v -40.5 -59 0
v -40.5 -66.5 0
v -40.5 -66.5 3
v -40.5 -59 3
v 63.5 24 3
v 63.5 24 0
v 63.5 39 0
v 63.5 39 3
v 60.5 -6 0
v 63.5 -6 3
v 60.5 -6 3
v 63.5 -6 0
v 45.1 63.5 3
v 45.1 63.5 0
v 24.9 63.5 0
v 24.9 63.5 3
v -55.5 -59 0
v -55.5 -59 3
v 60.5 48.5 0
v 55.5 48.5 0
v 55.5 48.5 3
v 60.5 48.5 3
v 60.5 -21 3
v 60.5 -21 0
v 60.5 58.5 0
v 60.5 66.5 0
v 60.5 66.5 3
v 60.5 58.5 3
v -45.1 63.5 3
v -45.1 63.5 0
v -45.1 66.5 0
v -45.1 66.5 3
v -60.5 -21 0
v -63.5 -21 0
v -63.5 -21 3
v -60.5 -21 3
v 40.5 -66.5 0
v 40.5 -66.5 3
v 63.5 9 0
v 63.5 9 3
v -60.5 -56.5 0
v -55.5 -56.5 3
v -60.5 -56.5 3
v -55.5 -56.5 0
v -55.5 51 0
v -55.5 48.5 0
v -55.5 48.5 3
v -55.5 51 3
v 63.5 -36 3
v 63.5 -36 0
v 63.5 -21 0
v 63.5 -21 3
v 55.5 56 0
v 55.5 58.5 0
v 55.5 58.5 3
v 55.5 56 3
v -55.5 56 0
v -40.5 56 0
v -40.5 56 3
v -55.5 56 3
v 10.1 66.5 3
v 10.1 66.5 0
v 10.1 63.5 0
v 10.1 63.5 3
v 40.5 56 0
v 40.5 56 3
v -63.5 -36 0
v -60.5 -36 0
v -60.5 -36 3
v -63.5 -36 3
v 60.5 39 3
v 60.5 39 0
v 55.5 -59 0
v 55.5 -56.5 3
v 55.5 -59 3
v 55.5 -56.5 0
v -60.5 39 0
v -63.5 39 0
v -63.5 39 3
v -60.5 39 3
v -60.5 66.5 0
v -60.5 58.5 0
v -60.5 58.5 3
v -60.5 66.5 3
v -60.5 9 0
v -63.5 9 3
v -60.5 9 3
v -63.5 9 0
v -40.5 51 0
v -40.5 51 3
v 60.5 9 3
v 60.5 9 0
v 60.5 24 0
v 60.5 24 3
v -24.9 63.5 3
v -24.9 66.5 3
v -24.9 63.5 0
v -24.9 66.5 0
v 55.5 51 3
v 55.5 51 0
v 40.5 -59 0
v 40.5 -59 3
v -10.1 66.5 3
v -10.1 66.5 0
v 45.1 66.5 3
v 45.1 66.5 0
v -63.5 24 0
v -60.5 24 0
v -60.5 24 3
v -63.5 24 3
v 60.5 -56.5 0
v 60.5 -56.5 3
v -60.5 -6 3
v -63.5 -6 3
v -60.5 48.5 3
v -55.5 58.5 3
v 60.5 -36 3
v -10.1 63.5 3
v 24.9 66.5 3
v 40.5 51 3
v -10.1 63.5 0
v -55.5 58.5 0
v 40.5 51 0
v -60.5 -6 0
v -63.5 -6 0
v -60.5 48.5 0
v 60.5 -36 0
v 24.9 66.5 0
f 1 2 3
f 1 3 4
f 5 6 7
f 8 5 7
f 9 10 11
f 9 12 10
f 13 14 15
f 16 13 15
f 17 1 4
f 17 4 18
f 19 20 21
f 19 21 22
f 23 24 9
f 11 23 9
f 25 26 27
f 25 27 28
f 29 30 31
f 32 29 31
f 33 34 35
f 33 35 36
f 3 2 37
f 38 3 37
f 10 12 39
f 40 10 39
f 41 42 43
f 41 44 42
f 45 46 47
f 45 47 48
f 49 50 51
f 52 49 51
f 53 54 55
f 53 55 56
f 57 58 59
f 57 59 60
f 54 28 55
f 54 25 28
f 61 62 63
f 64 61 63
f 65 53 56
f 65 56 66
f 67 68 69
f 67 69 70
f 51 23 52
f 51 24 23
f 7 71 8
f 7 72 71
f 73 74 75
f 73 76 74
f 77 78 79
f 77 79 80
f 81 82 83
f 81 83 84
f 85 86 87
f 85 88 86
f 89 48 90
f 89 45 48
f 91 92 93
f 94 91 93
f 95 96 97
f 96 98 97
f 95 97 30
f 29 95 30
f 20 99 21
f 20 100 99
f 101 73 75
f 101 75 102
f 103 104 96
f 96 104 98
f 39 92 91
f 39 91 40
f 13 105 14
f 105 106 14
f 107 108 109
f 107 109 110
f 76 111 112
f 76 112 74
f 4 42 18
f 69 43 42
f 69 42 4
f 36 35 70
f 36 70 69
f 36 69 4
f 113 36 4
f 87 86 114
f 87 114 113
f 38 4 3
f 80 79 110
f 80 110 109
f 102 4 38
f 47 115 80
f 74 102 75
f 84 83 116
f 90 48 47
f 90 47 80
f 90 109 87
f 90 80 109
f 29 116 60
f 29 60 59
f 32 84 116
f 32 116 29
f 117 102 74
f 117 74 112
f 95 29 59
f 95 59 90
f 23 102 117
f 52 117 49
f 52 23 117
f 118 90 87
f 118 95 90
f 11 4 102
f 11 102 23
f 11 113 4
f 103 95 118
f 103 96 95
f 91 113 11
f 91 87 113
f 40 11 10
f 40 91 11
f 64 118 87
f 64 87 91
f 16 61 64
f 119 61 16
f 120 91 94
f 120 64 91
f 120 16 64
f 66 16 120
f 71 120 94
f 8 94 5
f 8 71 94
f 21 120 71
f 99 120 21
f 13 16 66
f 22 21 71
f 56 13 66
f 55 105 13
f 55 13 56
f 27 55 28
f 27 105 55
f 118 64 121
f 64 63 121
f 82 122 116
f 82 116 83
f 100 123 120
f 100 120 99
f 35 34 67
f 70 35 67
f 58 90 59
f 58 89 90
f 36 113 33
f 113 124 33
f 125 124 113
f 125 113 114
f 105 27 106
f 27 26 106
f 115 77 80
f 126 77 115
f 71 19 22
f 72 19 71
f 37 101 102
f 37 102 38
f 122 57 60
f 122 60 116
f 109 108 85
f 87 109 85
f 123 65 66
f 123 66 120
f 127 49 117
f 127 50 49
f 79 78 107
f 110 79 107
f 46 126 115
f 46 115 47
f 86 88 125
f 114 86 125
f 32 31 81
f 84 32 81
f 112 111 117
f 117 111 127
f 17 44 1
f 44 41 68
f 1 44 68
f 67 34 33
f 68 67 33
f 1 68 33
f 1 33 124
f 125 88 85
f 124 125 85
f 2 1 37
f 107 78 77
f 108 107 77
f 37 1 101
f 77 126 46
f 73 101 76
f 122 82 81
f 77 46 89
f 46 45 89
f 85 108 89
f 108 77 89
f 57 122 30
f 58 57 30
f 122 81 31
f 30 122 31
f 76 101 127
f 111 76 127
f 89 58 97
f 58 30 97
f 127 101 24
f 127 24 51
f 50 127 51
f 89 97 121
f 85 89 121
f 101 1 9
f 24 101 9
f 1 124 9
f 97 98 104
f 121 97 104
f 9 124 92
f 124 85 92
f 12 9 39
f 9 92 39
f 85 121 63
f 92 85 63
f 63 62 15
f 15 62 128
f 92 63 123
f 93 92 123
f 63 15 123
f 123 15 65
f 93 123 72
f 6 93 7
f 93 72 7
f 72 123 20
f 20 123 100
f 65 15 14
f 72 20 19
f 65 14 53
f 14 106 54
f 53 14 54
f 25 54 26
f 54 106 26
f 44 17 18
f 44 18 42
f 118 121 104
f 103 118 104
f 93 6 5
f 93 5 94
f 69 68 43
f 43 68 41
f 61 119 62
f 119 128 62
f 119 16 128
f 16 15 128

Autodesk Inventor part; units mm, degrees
ref_plane "YZ Plane" through (0, 0, 0) normal (1, 0, 0) x (0, 1, 0)
ref_plane "XZ Plane" through (0, 0, 0) normal (0, 1, 0) x (-1, 0, 0)
ref_plane "XY Plane" through (0, 0, 0) normal (0, 0, 1) x (1, 0, 0)
sketch "Sketch1" plane through (0, 0, 0) normal (0, 0, 1) x (1, 0, 0)
  line L0 (-63.5, -66.5) -> (63.5, -66.5)
  line L1 (63.5, -66.5) -> (63.5, 66.5)
  line L2 (63.5, 66.5) -> (-63.5, 66.5)
  line L3 (-63.5, 66.5) -> (-63.5, -66.5)
  line L4 (-63.5, -66.5) -> (63.5, 66.5) construction
  line L5 (63.5, -66.5) -> (-63.5, 66.5) construction
  line L6 (-45.1, 66.5) -> (-24.9, 66.5)
  line L7 (-24.9, 66.5) -> (-24.9, 63.5)
  line L8 (-24.9, 63.5) -> (-45.1, 63.5)
  line L9 (-45.1, 63.5) -> (-45.1, 66.5)
  line L10 (-45.1, 66.5) -> (-24.9, 63.5) construction
  line L11 (-24.9, 66.5) -> (-45.1, 63.5) construction
  line L12 (-10.1, 66.5) -> (10.1, 66.5)
  line L13 (10.1, 66.5) -> (10.1, 63.5)
  line L14 (10.1, 63.5) -> (-10.1, 63.5)
  line L15 (-10.1, 63.5) -> (-10.1, 66.5)
  line L16 (-10.1, 66.5) -> (10.1, 63.5) construction
  line L17 (10.1, 66.5) -> (-10.1, 63.5) construction
  line L18 (24.9, 66.5) -> (45.1, 66.5)
  line L19 (45.1, 66.5) -> (45.1, 63.5)
  line L20 (45.1, 63.5) -> (24.9, 63.5)
  line L21 (24.9, 63.5) -> (24.9, 66.5)
  line L22 (24.9, 66.5) -> (45.1, 63.5) construction
  line L23 (45.1, 66.5) -> (24.9, 63.5) construction
  line L24 (-63.5, 39) -> (-60.5, 39)
  line L25 (-60.5, 39) -> (-60.5, 24) construction
  line L26 (-60.5, 24) -> (-63.5, 24)
  line L27 (-63.5, 24) -> (-63.5, 39)
  line L28 (-63.5, 39) -> (-60.5, 24) construction
  line L29 (-60.5, 39) -> (-63.5, 24) construction
  line L30 (-63.5, 9) -> (-60.5, 9)
  line L31 (-60.5, 9) -> (-60.5, -6) construction
  line L32 (-60.5, -6) -> (-63.5, -6)
  line L33 (-63.5, -6) -> (-63.5, 9)
  line L34 (-63.5, 9) -> (-60.5, -6) construction
  line L35 (-60.5, 9) -> (-63.5, -6) construction
  line L36 (-63.5, -21) -> (-60.5, -21)
  line L37 (-60.5, -21) -> (-60.5, -36) construction
  line L38 (-60.5, -36) -> (-63.5, -36)
  line L39 (-63.5, -36) -> (-63.5, -21)
  line L40 (-63.5, -21) -> (-60.5, -36) construction
  line L41 (-60.5, -21) -> (-63.5, -36) construction
  line L42 (-60.5, 39) -> (-60.5, 66.5)
  line L43 (-60.5, 24) -> (-60.5, 9)
  line L44 (-60.5, -6) -> (-60.5, -21)
  line L45 (-60.5, 51) -> (-40.5, 51)
  line L46 (-40.5, 51) -> (-40.5, 56)
  line L47 (-40.5, 56) -> (-60.5, 56)
  line L48 (-60.5, 56) -> (-60.5, 51)
  line L49 (-60.5, 51) -> (-40.5, 56) construction
  line L50 (-40.5, 51) -> (-60.5, 56) construction
  line L51 (-60.5, -64) -> (-40.5, -64)
  line L52 (-40.5, -66.5) -> (-40.5, -59)
  line L53 (-40.5, -59) -> (-60.5, -59)
  line L54 (-60.5, -59) -> (-60.5, -64)
  line L55 (-60.5, -64) -> (-40.5, -59) construction
  line L56 (-40.5, -64) -> (-60.5, -59) construction
  line L57 (-60.5, 48.5) -> (-55.5, 48.5)
  line L58 (-55.5, 48.5) -> (-55.5, 58.5)
  line L59 (-55.5, 58.5) -> (-60.5, 58.5)
  line L60 (-60.5, 58.5) -> (-60.5, 48.5)
  line L61 (-60.5, 48.5) -> (-55.5, 58.5) construction
  line L62 (-55.5, 48.5) -> (-60.5, 58.5) construction
  line L63 (-60.5, -66.5) -> (-55.5, -66.5)
  line L64 (-55.5, -66.5) -> (-55.5, -56.5)
  line L65 (-55.5, -56.5) -> (-60.5, -56.5)
  line L66 (-60.5, -56.5) -> (-60.5, -66.5)
  line L67 (-60.5, -66.5) -> (-55.5, -56.5) construction
  line L68 (-55.5, -66.5) -> (-60.5, -56.5) construction
  line L69 (-60.5, -36) -> (-60.5, -66.5)
  point P0 (0, 0)
  point P1 (-35, 65)
  point P2 (0, 65)
  point P3 (35, 65)
  point P4 (0, 66.5)
  point P5 (-62, 31.5)
  point P6 (-62, 1.5)
  point P7 (-62, -28.5)
  point P8 (45.1, 66.5)
  point P9 (24.9, 66.5)
  point P10 (10.1, 66.5)
  point P11 (-63.5, -36)
  point P12 (-63.5, -6)
  point P13 (-63.5, 9)
  point P14 (-63.5, 39)
  point P15 (-50.5, 53.5)
  point P16 (-50.5, -61.5)
  point P17 (-60.5, 56)
  point P18 (-60.5, 51)
  point P19 (-58, 53.5)
  point P20 (-40.5, 53.5)
  point P21 (-58, -61.5)
  point P22 (-55.5, 56)
  point P23 (-55.5, 51)
  point P24 (-55.5, -59)
  point P25 (-55.5, -64)
  dimension "d0" = 127
  dimension "d1" = 133
  dimension "d2" = 3
  dimension "d3" = 20.2
  dimension "d5" = 3
  dimension "d6" = 20.2
  dimension "d9" = 3
  dimension "d10" = 20.2
  dimension "d13" = 35
  dimension "d14" = 35
  dimension "d15" = 15
  dimension "d16" = 3
  dimension "d17" = 15
  dimension "d18" = 3
  dimension "d19" = 15
  dimension "d20" = 3
  dimension "d21" = 30
  dimension "d22" = 30
  dimension "d23" = 35
  dimension "d31" = 5
  dimension "d32" = 20
  dimension "d33" = 5
  dimension "d34" = 20
  dimension "d35" = 5
  dimension "d36" = 13
  dimension "d37" = 5
  dimension "d38" = 10
  dimension "d39" = 5
  dimension "d40" = 10
extrude "Extrusion1" add sketch "Sketch1" along normal blind 3 contours L3 L38 L69 L66 L54 L0 | L66 L51 L64 L0 | L3 L36 L44 L32 L30 L43 L26 L24 L42 L57 L58 L45 L46 L47 L59 L2 L9 L8 L7 L15 L14 L13 L21 L20 L19 L1 L0 L52 L53 L64 L65 L69 L38 | L64 L51 L52 L0 | L54 L53 L64 L51 | L3 L32 L44 L36 | L64 L53 L52 L51 | L66 L65 L64 L53 | L3 L26 L43 L30 | L3 L2 L42 L24 | L42 L45 L58 L57 | L59 L58 L47 L42 | L42 L47 L58 L45 | L58 L47 L46 L45
extrude "Extrusion2" cut sketch "Sketch1" along normal through all contours L3 L38 L69 L66 L54 L0 | L66 L51 L64 L0 | L64 L51 L52 L0 | L54 L53 L64 L51 | L3 L32 L44 L36 | L64 L53 L52 L51 | L66 L65 L64 L53 | L3 L26 L43 L30 | L3 L2 L42 L24 | L42 L45 L58 L57 | L59 L58 L47 L42 | L42 L47 L58 L45 | L58 L47 L46 L45
mirror "Mirror1" about plane through (0, 0, 0) normal (1, 0, 0) of "Extrusion2"
equation "\"d5\" = d2"
equation "\"d6\" = d3"
equation "\"d9\" = d2"
equation "\"d10\" = d11"
equation "\"d14\" = d13"
equation "\"d16\" = d2"
equation "\"d17\" = d15"
equation "\"d18\" = d16"
equation "\"d19\" = d17"
equation "\"d20\" = d18"
equation "\"d22\" = d21"
equation "\"d33\" = d31"
equation "\"d34\" = d32"
equation "\"d11\" = 20.2"
properties part number "bed_acrylic_floor"
